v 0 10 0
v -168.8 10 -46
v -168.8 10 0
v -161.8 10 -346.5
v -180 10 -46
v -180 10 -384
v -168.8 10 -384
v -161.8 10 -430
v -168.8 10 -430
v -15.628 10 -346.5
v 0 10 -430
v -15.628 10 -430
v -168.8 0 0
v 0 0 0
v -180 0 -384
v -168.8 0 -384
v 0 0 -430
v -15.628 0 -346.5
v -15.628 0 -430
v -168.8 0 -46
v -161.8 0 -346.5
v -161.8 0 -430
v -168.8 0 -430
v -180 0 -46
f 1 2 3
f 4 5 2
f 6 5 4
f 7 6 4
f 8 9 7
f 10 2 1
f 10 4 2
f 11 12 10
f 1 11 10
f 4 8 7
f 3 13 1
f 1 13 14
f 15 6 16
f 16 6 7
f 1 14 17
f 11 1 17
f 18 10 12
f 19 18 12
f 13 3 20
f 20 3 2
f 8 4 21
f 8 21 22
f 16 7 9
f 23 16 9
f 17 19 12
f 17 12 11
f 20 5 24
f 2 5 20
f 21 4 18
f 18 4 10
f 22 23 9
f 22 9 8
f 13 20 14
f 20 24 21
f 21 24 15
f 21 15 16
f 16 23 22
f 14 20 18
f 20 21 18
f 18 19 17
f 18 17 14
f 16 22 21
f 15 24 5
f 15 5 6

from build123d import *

# Parameters (mm, degrees)
ESQUISSE1_W             = 180
ESQUISSE1_H             = 430
BOSS_EXTRU_1_DEPTH      = 10
ESQUISSE2_W             = 146.172243306
ESQUISSE2_H             = 83.5
ENL_V_MAT_EXTRU_1_DEPTH = 10
ESQUISSE3_W             = 11.2
ESQUISSE3_H             = 46
ENL_V_MAT_EXTRU_2_DEPTH = 10


with BuildPart() as part:
    # Esquisse1 → Boss.-Extru.1 (new body)
    with BuildSketch(Plane(origin=(0, 0, 0), x_dir=(1, 0, 0), z_dir=(0, 1, 0))):
        with Locations((-90, 215)):
            Rectangle(ESQUISSE1_W, ESQUISSE1_H)
    extrude(amount=BOSS_EXTRU_1_DEPTH)

    # Esquisse2 → Enlèv. mat.-Extru.1 (cut)
    with BuildSketch(Plane(origin=(0, 10, 0), x_dir=(1, 0, 0), z_dir=(0, 1, 0))):
        with Locations((-88.713878322, 388.25)):
            Rectangle(ESQUISSE2_W, ESQUISSE2_H)
    extrude(amount=-ENL_V_MAT_EXTRU_1_DEPTH, mode=Mode.SUBTRACT)

    # Esquisse3 → Enlèv. mat.-Extru.2 (cut)
    with BuildSketch(Plane(origin=(0, 10, 0), x_dir=(1, 0, 0), z_dir=(0, 1, 0))):
        with Locations((-174.4, 407)):
            Rectangle(ESQUISSE3_W, ESQUISSE3_H)
        with Locations((-174.4, 23)):
            Rectangle(ESQUISSE3_W, ESQUISSE3_H)
    extrude(amount=-ENL_V_MAT_EXTRU_2_DEPTH, mode=Mode.SUBTRACT)


solid = part.part
